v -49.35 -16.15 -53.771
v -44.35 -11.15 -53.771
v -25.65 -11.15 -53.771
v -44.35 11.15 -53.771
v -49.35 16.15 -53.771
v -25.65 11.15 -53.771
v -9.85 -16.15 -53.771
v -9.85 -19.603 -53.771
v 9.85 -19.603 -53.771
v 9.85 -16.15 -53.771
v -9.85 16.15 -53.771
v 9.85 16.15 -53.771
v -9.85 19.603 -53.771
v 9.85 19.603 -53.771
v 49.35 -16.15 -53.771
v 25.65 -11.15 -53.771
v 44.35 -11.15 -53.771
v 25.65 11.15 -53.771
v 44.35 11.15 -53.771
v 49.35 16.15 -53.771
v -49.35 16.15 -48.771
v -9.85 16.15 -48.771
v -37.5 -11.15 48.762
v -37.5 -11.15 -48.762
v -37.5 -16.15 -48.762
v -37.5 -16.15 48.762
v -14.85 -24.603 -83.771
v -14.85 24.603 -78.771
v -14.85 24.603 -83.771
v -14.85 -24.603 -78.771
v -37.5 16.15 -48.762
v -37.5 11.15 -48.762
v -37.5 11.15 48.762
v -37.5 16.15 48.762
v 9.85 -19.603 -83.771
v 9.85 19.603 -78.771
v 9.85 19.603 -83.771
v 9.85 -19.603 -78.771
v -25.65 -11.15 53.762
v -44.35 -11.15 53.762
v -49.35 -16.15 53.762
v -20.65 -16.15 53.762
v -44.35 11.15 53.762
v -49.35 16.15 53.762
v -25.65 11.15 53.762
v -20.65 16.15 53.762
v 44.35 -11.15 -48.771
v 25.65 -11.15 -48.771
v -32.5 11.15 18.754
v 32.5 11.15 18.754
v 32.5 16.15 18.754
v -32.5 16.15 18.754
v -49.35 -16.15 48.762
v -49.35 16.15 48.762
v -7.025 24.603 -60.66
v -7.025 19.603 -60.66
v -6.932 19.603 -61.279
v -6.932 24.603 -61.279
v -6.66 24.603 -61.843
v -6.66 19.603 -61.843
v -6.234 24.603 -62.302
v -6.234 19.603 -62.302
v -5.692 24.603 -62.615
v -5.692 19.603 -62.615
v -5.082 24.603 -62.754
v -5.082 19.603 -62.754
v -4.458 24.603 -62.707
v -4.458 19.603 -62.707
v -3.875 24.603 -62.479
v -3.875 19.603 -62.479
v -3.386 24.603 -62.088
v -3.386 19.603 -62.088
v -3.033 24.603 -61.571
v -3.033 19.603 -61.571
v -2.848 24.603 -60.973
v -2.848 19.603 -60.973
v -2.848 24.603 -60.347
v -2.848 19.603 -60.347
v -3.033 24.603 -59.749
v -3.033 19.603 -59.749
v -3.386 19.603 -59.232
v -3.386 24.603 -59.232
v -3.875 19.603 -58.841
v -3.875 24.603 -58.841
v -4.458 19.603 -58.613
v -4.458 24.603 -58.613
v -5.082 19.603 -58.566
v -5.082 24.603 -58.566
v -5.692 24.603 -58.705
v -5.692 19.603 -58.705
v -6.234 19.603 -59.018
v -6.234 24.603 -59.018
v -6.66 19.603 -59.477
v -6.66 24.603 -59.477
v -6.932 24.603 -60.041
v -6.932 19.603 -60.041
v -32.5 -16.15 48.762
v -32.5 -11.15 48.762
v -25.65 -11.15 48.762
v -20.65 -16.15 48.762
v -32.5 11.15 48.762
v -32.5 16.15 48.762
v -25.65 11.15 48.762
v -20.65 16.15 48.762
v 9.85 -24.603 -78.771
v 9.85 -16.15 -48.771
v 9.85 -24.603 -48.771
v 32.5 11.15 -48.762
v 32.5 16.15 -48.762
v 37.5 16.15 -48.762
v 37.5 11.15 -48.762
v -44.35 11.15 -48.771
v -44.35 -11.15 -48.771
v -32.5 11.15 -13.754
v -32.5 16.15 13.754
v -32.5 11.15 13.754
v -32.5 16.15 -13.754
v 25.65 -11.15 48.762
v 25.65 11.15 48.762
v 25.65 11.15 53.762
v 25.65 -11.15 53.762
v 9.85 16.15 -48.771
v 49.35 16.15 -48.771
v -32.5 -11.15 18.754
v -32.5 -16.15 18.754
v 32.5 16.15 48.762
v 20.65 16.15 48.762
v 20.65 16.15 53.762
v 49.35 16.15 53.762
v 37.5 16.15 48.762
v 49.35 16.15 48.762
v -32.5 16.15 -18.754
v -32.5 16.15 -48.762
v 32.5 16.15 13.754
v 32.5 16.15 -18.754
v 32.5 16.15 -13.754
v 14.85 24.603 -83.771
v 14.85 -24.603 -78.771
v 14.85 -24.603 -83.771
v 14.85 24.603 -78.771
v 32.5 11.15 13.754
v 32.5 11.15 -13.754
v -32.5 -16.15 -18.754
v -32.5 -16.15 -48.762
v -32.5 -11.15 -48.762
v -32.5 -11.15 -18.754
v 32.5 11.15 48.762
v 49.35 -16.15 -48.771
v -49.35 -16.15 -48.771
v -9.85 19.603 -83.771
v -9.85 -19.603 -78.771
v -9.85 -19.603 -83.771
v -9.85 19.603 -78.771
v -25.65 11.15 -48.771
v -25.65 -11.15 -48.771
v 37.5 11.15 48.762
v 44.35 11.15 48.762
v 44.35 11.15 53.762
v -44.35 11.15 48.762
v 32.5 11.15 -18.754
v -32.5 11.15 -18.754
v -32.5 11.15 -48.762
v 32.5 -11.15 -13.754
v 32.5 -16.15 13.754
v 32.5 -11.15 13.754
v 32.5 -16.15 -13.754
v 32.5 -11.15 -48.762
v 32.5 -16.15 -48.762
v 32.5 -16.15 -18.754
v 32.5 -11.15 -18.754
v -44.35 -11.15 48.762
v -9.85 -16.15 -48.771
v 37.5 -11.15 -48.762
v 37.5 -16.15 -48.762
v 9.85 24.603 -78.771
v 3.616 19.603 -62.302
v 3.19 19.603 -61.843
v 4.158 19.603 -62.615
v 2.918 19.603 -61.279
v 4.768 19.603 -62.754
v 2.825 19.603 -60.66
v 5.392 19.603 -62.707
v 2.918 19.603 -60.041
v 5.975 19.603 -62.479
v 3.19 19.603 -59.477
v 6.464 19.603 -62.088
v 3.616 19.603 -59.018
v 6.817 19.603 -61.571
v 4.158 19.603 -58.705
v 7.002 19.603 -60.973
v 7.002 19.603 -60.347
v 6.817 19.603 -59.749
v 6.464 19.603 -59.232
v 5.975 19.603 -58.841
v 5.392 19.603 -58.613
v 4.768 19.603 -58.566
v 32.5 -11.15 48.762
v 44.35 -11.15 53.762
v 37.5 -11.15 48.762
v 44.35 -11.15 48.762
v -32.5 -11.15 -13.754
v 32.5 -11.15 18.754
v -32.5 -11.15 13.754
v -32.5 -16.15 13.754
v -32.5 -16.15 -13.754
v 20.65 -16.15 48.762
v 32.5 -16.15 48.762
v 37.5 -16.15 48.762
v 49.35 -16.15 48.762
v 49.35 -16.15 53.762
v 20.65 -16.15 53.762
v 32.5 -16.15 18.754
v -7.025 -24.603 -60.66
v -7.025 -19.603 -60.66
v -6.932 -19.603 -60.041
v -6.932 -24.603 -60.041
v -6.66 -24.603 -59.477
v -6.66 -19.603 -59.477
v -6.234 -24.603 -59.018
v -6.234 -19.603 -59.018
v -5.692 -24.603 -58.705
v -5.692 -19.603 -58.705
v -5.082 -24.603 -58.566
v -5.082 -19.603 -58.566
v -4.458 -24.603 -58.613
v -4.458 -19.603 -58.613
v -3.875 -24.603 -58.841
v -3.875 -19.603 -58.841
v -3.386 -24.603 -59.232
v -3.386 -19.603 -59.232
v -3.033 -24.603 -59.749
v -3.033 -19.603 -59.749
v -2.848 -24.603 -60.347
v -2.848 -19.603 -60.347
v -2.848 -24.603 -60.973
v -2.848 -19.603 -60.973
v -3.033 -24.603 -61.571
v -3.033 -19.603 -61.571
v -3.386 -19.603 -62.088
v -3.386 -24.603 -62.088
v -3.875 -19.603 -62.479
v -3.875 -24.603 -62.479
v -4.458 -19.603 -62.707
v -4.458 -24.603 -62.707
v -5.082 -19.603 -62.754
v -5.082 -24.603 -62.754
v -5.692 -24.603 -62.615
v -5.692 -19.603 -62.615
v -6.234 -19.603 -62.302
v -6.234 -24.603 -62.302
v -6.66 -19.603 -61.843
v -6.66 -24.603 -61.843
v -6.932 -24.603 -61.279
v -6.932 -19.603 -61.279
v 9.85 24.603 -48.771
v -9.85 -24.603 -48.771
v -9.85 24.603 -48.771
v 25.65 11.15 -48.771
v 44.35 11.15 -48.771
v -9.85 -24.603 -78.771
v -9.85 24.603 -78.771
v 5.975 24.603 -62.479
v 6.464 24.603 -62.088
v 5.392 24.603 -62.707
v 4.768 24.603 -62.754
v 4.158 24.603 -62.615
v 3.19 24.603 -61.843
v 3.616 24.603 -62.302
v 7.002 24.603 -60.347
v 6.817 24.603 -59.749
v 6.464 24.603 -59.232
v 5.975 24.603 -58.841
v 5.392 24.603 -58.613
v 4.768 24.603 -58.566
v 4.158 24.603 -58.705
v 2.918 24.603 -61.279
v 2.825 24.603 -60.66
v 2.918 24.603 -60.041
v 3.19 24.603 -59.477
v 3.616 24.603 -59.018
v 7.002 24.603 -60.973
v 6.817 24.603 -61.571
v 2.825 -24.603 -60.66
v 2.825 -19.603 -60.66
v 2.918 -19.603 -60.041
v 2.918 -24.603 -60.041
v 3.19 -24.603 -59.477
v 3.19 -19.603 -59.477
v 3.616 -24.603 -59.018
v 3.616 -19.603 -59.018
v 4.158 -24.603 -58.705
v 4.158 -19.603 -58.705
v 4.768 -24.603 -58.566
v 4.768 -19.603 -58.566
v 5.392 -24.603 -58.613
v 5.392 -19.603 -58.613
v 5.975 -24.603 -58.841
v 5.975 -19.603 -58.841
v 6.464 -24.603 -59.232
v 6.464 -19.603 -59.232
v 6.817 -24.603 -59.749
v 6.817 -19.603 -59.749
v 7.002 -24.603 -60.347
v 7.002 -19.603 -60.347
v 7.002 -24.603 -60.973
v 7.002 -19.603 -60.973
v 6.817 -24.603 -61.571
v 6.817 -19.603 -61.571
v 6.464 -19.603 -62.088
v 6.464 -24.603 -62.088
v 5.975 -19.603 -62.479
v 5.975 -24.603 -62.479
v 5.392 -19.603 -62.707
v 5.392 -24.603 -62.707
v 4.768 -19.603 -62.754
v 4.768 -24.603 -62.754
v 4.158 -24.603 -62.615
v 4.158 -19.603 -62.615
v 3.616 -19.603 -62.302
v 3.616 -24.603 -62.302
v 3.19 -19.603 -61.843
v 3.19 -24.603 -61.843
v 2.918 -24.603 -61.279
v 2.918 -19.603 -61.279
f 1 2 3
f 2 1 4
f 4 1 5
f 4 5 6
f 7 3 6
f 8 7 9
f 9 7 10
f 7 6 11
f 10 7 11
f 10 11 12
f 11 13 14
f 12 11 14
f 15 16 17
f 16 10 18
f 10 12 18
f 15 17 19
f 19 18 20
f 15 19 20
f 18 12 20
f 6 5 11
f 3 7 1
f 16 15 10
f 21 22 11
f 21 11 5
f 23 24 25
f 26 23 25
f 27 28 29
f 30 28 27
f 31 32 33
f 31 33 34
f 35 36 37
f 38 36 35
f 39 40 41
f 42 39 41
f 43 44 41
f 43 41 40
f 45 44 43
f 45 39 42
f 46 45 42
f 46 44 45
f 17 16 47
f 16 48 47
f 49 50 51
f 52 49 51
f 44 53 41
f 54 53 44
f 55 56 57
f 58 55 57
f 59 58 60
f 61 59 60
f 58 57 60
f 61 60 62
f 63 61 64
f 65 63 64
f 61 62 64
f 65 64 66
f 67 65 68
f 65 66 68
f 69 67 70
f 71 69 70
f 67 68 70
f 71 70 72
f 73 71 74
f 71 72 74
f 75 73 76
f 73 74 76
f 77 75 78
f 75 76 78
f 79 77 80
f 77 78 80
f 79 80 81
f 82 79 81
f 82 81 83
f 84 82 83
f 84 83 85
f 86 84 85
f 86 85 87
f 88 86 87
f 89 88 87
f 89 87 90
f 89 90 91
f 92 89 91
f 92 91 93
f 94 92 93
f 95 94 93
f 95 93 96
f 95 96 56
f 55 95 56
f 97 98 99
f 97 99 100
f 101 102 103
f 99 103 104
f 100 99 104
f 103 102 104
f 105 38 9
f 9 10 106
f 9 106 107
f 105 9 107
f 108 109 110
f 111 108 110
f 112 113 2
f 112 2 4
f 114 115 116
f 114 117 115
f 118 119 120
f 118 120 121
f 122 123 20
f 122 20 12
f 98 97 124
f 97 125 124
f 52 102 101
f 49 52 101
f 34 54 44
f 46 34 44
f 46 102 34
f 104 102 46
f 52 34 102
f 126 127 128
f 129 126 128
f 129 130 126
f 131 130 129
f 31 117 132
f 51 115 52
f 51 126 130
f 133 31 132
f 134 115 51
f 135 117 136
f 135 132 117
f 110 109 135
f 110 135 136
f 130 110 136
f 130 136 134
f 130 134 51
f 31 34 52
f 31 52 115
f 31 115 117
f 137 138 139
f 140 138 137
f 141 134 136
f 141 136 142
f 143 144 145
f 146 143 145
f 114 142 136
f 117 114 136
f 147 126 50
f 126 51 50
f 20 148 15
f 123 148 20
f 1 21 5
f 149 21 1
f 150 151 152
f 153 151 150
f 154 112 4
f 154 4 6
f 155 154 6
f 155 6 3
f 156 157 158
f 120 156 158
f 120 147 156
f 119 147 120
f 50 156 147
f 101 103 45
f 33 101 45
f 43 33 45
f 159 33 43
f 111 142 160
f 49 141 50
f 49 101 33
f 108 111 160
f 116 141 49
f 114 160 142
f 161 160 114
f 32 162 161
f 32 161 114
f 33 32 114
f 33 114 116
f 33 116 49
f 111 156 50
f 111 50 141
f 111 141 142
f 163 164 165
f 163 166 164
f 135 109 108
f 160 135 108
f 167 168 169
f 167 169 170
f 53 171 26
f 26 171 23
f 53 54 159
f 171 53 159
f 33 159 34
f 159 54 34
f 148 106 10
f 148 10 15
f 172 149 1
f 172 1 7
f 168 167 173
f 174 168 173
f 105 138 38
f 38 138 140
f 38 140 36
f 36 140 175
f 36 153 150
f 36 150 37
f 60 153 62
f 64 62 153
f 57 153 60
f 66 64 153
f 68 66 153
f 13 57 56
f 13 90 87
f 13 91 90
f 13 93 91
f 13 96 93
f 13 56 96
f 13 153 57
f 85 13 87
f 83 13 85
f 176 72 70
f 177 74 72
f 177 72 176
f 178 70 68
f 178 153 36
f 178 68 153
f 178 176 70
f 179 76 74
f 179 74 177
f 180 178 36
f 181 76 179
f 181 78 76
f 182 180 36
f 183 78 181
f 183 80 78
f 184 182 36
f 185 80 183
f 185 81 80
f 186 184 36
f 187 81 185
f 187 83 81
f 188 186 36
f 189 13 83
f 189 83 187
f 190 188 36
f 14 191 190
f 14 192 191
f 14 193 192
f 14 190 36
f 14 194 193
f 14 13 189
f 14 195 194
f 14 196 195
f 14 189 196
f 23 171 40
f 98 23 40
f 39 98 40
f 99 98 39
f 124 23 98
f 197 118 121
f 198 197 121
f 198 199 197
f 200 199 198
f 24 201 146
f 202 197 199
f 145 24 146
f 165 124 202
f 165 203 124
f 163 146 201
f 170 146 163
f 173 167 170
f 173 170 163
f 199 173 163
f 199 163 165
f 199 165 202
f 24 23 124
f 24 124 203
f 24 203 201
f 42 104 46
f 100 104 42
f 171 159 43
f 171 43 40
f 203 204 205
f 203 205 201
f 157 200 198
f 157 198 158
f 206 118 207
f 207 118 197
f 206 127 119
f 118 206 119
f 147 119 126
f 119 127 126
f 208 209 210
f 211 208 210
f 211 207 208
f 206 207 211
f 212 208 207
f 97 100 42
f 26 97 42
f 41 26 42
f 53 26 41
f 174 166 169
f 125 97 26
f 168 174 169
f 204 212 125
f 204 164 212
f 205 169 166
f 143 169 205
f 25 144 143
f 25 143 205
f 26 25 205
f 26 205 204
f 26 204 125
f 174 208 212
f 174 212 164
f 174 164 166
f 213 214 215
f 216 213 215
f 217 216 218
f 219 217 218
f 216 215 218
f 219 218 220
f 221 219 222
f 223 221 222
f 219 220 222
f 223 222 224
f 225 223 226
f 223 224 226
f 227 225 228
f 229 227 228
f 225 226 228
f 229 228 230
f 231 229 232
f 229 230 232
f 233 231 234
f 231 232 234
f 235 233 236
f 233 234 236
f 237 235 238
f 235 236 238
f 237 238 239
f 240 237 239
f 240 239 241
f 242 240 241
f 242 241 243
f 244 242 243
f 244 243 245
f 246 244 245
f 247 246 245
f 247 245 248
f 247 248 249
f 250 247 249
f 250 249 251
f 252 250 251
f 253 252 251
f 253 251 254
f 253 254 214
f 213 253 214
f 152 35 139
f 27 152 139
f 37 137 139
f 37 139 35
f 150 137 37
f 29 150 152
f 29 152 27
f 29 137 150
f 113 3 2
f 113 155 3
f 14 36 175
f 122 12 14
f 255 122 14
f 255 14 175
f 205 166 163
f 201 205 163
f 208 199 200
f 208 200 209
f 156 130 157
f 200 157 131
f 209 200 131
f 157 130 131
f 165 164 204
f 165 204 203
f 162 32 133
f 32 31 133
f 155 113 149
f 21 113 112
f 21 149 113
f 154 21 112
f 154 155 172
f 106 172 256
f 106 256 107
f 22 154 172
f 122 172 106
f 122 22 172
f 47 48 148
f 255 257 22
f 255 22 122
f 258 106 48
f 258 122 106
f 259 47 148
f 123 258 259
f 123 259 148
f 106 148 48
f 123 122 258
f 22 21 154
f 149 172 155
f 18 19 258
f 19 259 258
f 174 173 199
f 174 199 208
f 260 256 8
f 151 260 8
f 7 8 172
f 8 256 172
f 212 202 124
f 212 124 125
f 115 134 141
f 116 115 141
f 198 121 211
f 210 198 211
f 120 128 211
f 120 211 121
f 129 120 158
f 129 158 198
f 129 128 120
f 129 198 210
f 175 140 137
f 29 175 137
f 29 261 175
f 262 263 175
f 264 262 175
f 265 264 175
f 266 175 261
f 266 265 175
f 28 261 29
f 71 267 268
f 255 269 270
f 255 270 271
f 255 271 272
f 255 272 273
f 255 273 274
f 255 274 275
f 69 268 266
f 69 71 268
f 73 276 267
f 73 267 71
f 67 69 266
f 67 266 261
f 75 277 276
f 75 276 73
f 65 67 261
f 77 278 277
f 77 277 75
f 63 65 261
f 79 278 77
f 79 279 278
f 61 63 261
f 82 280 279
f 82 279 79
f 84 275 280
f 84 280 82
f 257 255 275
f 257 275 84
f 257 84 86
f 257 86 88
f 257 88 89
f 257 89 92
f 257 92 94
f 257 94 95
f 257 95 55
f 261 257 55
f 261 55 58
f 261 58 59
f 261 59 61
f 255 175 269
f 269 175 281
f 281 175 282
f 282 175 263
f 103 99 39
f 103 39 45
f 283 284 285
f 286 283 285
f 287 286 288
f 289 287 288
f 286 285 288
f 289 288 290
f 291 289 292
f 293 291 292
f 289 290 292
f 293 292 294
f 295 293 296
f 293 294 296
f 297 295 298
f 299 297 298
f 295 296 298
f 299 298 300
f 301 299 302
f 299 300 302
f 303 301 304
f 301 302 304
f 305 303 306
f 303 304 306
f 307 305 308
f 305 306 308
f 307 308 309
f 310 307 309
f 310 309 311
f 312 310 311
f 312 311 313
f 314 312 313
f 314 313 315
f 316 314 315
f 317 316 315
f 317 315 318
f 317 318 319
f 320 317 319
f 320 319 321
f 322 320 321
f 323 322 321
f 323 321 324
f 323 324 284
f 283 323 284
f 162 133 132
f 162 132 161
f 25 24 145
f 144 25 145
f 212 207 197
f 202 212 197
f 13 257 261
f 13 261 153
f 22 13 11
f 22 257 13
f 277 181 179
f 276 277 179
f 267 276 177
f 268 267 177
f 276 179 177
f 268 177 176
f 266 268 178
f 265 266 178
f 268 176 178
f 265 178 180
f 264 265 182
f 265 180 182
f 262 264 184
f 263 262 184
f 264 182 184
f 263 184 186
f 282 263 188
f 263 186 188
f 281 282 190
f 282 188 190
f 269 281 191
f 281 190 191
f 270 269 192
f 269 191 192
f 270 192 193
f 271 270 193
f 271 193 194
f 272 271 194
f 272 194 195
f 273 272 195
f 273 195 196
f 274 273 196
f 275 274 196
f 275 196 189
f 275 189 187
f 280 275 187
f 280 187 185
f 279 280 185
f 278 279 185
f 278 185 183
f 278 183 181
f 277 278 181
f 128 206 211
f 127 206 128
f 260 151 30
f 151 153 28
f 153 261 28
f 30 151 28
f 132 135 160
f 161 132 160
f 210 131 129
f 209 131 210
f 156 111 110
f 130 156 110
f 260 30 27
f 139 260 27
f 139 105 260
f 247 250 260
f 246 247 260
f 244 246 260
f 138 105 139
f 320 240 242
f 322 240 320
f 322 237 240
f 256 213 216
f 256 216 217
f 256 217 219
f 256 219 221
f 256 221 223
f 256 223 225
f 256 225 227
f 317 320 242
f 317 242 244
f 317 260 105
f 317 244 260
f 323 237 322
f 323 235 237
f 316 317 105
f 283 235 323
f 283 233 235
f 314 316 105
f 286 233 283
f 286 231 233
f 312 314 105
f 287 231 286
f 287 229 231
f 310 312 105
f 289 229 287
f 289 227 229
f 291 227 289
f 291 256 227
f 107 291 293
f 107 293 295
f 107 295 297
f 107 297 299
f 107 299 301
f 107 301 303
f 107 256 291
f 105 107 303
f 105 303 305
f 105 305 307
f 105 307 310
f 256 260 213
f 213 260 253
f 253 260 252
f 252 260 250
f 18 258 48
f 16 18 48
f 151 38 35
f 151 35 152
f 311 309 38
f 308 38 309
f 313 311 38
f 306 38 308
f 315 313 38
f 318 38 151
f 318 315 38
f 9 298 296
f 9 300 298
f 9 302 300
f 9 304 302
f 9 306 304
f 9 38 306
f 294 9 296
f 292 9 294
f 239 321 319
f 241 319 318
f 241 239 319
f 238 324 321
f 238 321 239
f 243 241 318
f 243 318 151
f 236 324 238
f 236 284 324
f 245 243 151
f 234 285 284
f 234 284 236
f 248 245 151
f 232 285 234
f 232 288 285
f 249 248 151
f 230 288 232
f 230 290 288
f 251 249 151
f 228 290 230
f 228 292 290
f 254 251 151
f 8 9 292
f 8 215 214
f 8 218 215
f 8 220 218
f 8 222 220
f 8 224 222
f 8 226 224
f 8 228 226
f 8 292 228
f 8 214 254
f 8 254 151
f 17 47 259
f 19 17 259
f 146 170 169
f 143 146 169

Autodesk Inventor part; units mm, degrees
sketch "Sketch1" plane through (0, 0, 0) normal (0, 0, 1) x (1, 0, 0)
  line L0 (-32.5, 11.15) -> (32.5, 11.15) construction
  line L1 (32.5, 11.15) -> (32.5, -11.15) construction
  line L2 (32.5, -11.15) -> (-32.5, -11.15) construction
  line L3 (-32.5, -11.15) -> (-32.5, 11.15) construction
  line L4 (-32.5, 11.15) -> (32.5, -11.15) construction
  line L5 (32.5, 11.15) -> (-32.5, -11.15) construction
  line L6 (-32.5, 11.15) -> (-37.5, 11.15)
  line L7 (-37.5, 11.15) -> (-37.5, 16.15)
  line L8 (-37.5, 16.15) -> (-32.5, 16.15)
  line L9 (-32.5, 16.15) -> (-32.5, 11.15)
  line L10 (32.5, 11.15) -> (37.5, 11.15)
  line L11 (37.5, 11.15) -> (37.5, 16.15)
  line L12 (37.5, 16.15) -> (32.5, 16.15)
  line L13 (32.5, 16.15) -> (32.5, 11.15)
  line L14 (32.5, -11.15) -> (37.5, -11.15)
  line L15 (37.5, -11.15) -> (37.5, -16.15)
  line L16 (37.5, -16.15) -> (32.5, -16.15)
  line L17 (32.5, -16.15) -> (32.5, -11.15)
  line L18 (-32.5, -11.15) -> (-37.5, -11.15)
  line L19 (-37.5, -11.15) -> (-37.5, -16.15)
  line L20 (-37.5, -16.15) -> (-32.5, -16.15)
  line L21 (-32.5, -16.15) -> (-32.5, -11.15)
  point P0 (0, 0)
  dimension "d0" = 65
  dimension "d1" = 22.3
  dimension "d2" = 5
  dimension "d3" = 5
  dimension "d4" = 5
  dimension "d5" = 5
  dimension "d6" = 5
  dimension "d7" = 5
  dimension "d8" = 5
  dimension "d9" = 5
extrude "Extrusion1" add sketch "Sketch1" along normal mid plane 97.524
ref_plane "Work Plane1" through (0, 0, 48.762) normal (0, 0, 1) x (1, 0, 0)
sketch "Sketch2" plane through (0, 0, 48.762) normal (0, 0, 1) x (1, 0, 0)
  line L0 (0, 0) -> (-35, 0) construction
  line L1 (0, 0) -> (35, 0) construction
  line L2 (-49.35, 16.15) -> (-20.65, 16.15)
  line L3 (-20.65, 16.15) -> (-20.65, -16.15)
  line L4 (-20.65, -16.15) -> (-49.35, -16.15)
  line L5 (-49.35, -16.15) -> (-49.35, 16.15)
  line L6 (-49.35, 16.15) -> (-20.65, -16.15) construction
  line L7 (-20.65, 16.15) -> (-49.35, -16.15) construction
  line L8 (20.65, 16.15) -> (49.35, 16.15)
  line L9 (49.35, 16.15) -> (49.35, -16.15)
  line L10 (49.35, -16.15) -> (20.65, -16.15)
  line L11 (20.65, -16.15) -> (20.65, 16.15)
  line L12 (20.65, 16.15) -> (49.35, -16.15) construction
  line L13 (49.35, 16.15) -> (20.65, -16.15) construction
  line L14 (-25.65, 11.15) -> (-44.35, 11.15)
  line L15 (-44.35, 11.15) -> (-44.35, -11.15)
  line L16 (-44.35, -11.15) -> (-25.65, -11.15)
  line L17 (-25.65, -11.15) -> (-25.65, 11.15)
  line L18 (44.35, 11.15) -> (25.65, 11.15)
  line L19 (25.65, 11.15) -> (25.65, -11.15)
  line L20 (25.65, -11.15) -> (44.35, -11.15)
  line L21 (44.35, -11.15) -> (44.35, 11.15)
  dimension "d13" = 35
  dimension "d14" = 35
  dimension "d15" = 28.7
  dimension "d16" = 32.3
  dimension "d17" = 28.7
  dimension "d18" = 32.3
  dimension "d19" = 5
  dimension "d20" = 5
extrude "Extrusion2" add sketch "Sketch2" along normal blind 5
ref_plane "Work Plane2" through (0, 0, -48.771) normal (0, 0, 1) x (1, 0, 0)
sketch "Sketch3" plane through (0, 0, -48.771) normal (0, 0, 1) x (1, 0, 0)
  line L0 (49.35, 16.15) -> (-49.35, 16.15)
  line L1 (-49.35, 16.15) -> (-49.35, -16.15)
  line L2 (-49.35, -16.15) -> (49.35, -16.15)
  line L3 (49.35, -16.15) -> (49.35, 16.15)
  line L4 (49.35, 16.15) -> (-49.35, -16.15) construction
  line L5 (-49.35, 16.15) -> (49.35, -16.15) construction
  line L6 (0, 0) -> (35, 0) construction
  line L7 (0, 0) -> (-35, 0) construction
  line L8 (32.5, -11.15) -> (25.65, -11.15) projected
  line L9 (44.35, 11.15) -> (25.65, 11.15)
  line L10 (25.65, 11.15) -> (25.65, -11.15)
  line L11 (25.65, -11.15) -> (44.35, -11.15)
  line L12 (44.35, -11.15) -> (44.35, 11.15)
  line L13 (44.35, 11.15) -> (25.65, -11.15) construction
  line L14 (25.65, 11.15) -> (44.35, -11.15) construction
  line L15 (-44.35, -11.15) -> (-44.35, 11.15) projected
  line L16 (-25.65, -11.15) -> (-44.35, -11.15)
  line L17 (-44.35, -11.15) -> (-44.35, 11.15)
  line L18 (-44.35, 11.15) -> (-25.65, 11.15)
  line L19 (-25.65, 11.15) -> (-25.65, -11.15)
  line L20 (-25.65, -11.15) -> (-44.35, 11.15) construction
  line L21 (-44.35, -11.15) -> (-25.65, 11.15) construction
  line L22 (0, 0) -> (0, 24.603) construction
  line L23 (0, 24.603) -> (9.85, 24.603) construction
  line L24 (9.85, 24.603) -> (-9.85, 24.603)
  line L25 (-9.85, 24.603) -> (-9.85, 16.15)
  line L26 (-9.85, 16.15) -> (9.85, 16.15)
  line L27 (9.85, 16.15) -> (9.85, 24.603)
  line L28 (0, 0) -> (0, -24.603) construction
  line L29 (0, -24.603) -> (9.85, -24.603) construction
  line L30 (9.85, -24.603) -> (-9.85, -24.603)
  line L31 (-9.85, -24.603) -> (-9.85, -16.15)
  line L32 (-9.85, -16.15) -> (9.85, -16.15)
  line L33 (9.85, -16.15) -> (9.85, -24.603)
  point P0 (30, -11.15)
  dimension "d24" = 98.7
  dimension "d25" = 32.3
  dimension "d26" = 35
  dimension "d27" = 35
  dimension "d76" = 24.603
  dimension "d77" = 9.85
  dimension "d78" = 19.7
  dimension "d79" = 24.603
  dimension "d80" = 9.85
  dimension "d81" = 19.7
extrude "Extrusion3" add sketch "Sketch3" against normal blind 5
sketch "Sketch4" plane through (0, 0, 0) normal (1, 0, 0) x (0, 1, 0)
  line L0 (11.15, -48.762) -> (11.15, 48.762) projected
  line L1 (11.15, 18.754) -> (16.15, 18.754)
  line L2 (16.15, 18.754) -> (16.15, 13.754)
  line L3 (16.15, 13.754) -> (11.15, 13.754)
  line L4 (11.15, 13.754) -> (11.15, 18.754)
  line L5 (-16.15, 48.762) -> (16.15, 48.762) projected
  line L6 (11.15, -13.754) -> (16.15, -13.754)
  line L7 (16.15, -13.754) -> (16.15, -18.754)
  line L8 (16.15, -18.754) -> (11.15, -18.754)
  line L9 (11.15, -18.754) -> (11.15, -13.754)
  line L10 (16.15, -48.762) -> (11.15, -48.762) projected
  line L11 (-11.15, 48.762) -> (-11.15, -48.762) projected
  line L12 (-11.15, 18.754) -> (-16.15, 18.754)
  line L13 (-16.15, 18.754) -> (-16.15, 13.754)
  line L14 (-16.15, 13.754) -> (-11.15, 13.754)
  line L15 (-11.15, 13.754) -> (-11.15, 18.754)
  line L16 (-11.15, -18.754) -> (-16.15, -18.754)
  line L17 (-16.15, -18.754) -> (-16.15, -13.754)
  line L18 (-16.15, -13.754) -> (-11.15, -13.754)
  line L19 (-11.15, -13.754) -> (-11.15, -18.754)
  line L20 (-11.15, -48.762) -> (-16.15, -48.762) projected
  point P0 (0, 0)
  dimension "d30" = 5
  dimension "d31" = 5
  dimension "d32" = 30.008
  dimension "d33" = 5
  dimension "d34" = 5
  dimension "d35" = 30.008
  dimension "d36" = 5
  dimension "d37" = 5
  dimension "d38" = 5
  dimension "d39" = 5
  dimension "d40" = 30.008
  dimension "d41" = 30.008
extrude "Extrusion4" add sketch "Sketch4" along normal mid plane 65
sketch "Sketch7" plane through (0, 0, -53.771) normal (0, 0, -1) x (-1, 0, 0)
  line L0 (-9.85, 24.603) -> (9.85, 24.603)
  line L1 (9.85, 24.603) -> (9.85, -24.603)
  line L2 (9.85, -24.603) -> (-9.85, -24.603)
  line L3 (-9.85, -24.603) -> (-9.85, 24.603)
  line L4 (-9.85, 24.603) -> (9.85, -24.603) construction
  line L5 (9.85, 24.603) -> (-9.85, -24.603) construction
  line L6 (-9.85, 19.603) -> (9.85, 19.603)
  line L7 (-9.85, -19.603) -> (9.85, -19.603)
  point P0 (0, 0)
  point P1 (4.85, 24.603)
  point P2 (4.85, -24.603)
  point P3 (-4.85, 24.603)
  point P4 (-4.85, -24.603)
  dimension "d54" = 19.7
  dimension "d55" = 49.206
  dimension "d74" = 5
  dimension "d75" = 5
extrude "Extrusion7" add sketch "Sketch7" along normal blind 25 contours L0 L1 L6 L3 | L7 L1 L2 L3
ref_plane "Work Plane3" through (0, 0, -78.771) normal (0, 0, -1) x (-1, 0, 0)
sketch "Sketch8" plane through (0, 0, -78.771) normal (0, 0, -1) x (-1, 0, 0)
  line L0 (-14.85, 24.603) -> (14.85, 24.603)
  line L1 (14.85, 24.603) -> (14.85, -24.603)
  line L2 (14.85, -24.603) -> (-14.85, -24.603)
  line L3 (-14.85, -24.603) -> (-14.85, 24.603)
  line L4 (-14.85, 24.603) -> (14.85, -24.603) construction
  line L5 (14.85, 24.603) -> (-14.85, -24.603) construction
  line L6 (9.85, 19.603) -> (-9.85, 19.603)
  line L7 (-9.85, 19.603) -> (-9.85, -19.603)
  line L8 (-9.85, -19.603) -> (9.85, -19.603)
  line L9 (9.85, -19.603) -> (9.85, 19.603)
  point P0 (0, 0)
  dimension "d61" = 29.7
  dimension "d62" = 49.206
  dimension "d63" = 5
extrude "Extrusion8" add sketch "Sketch8" along normal blind 5
sketch "Sketch10" plane through (0, 0, 0) normal (0, 1, 0) x (-1, 0, 0)
  circle A0 centre (-4.925, -60.66) radius 2.1
  line L0 (-9.85, -53.771) -> (9.85, -53.771) projected
  line L1 (-9.85, -53.771) -> (-9.85, -78.771) projected
  circle A1 centre (4.925, -60.66) radius 2.1
  line L2 (9.85, -53.771) -> (9.85, -78.771) projected
  point P0 (0, 0)
  dimension "d82" = 4.2
  dimension "d83" = 6.889
  dimension "d84" = 4.925
  dimension "d85" = 4.2
  dimension "d86" = 6.889
  dimension "d87" = 4.925
extrude "Extrusion10" cut sketch "Sketch10" along normal through all both and the other way through all
properties part number "MTail"
